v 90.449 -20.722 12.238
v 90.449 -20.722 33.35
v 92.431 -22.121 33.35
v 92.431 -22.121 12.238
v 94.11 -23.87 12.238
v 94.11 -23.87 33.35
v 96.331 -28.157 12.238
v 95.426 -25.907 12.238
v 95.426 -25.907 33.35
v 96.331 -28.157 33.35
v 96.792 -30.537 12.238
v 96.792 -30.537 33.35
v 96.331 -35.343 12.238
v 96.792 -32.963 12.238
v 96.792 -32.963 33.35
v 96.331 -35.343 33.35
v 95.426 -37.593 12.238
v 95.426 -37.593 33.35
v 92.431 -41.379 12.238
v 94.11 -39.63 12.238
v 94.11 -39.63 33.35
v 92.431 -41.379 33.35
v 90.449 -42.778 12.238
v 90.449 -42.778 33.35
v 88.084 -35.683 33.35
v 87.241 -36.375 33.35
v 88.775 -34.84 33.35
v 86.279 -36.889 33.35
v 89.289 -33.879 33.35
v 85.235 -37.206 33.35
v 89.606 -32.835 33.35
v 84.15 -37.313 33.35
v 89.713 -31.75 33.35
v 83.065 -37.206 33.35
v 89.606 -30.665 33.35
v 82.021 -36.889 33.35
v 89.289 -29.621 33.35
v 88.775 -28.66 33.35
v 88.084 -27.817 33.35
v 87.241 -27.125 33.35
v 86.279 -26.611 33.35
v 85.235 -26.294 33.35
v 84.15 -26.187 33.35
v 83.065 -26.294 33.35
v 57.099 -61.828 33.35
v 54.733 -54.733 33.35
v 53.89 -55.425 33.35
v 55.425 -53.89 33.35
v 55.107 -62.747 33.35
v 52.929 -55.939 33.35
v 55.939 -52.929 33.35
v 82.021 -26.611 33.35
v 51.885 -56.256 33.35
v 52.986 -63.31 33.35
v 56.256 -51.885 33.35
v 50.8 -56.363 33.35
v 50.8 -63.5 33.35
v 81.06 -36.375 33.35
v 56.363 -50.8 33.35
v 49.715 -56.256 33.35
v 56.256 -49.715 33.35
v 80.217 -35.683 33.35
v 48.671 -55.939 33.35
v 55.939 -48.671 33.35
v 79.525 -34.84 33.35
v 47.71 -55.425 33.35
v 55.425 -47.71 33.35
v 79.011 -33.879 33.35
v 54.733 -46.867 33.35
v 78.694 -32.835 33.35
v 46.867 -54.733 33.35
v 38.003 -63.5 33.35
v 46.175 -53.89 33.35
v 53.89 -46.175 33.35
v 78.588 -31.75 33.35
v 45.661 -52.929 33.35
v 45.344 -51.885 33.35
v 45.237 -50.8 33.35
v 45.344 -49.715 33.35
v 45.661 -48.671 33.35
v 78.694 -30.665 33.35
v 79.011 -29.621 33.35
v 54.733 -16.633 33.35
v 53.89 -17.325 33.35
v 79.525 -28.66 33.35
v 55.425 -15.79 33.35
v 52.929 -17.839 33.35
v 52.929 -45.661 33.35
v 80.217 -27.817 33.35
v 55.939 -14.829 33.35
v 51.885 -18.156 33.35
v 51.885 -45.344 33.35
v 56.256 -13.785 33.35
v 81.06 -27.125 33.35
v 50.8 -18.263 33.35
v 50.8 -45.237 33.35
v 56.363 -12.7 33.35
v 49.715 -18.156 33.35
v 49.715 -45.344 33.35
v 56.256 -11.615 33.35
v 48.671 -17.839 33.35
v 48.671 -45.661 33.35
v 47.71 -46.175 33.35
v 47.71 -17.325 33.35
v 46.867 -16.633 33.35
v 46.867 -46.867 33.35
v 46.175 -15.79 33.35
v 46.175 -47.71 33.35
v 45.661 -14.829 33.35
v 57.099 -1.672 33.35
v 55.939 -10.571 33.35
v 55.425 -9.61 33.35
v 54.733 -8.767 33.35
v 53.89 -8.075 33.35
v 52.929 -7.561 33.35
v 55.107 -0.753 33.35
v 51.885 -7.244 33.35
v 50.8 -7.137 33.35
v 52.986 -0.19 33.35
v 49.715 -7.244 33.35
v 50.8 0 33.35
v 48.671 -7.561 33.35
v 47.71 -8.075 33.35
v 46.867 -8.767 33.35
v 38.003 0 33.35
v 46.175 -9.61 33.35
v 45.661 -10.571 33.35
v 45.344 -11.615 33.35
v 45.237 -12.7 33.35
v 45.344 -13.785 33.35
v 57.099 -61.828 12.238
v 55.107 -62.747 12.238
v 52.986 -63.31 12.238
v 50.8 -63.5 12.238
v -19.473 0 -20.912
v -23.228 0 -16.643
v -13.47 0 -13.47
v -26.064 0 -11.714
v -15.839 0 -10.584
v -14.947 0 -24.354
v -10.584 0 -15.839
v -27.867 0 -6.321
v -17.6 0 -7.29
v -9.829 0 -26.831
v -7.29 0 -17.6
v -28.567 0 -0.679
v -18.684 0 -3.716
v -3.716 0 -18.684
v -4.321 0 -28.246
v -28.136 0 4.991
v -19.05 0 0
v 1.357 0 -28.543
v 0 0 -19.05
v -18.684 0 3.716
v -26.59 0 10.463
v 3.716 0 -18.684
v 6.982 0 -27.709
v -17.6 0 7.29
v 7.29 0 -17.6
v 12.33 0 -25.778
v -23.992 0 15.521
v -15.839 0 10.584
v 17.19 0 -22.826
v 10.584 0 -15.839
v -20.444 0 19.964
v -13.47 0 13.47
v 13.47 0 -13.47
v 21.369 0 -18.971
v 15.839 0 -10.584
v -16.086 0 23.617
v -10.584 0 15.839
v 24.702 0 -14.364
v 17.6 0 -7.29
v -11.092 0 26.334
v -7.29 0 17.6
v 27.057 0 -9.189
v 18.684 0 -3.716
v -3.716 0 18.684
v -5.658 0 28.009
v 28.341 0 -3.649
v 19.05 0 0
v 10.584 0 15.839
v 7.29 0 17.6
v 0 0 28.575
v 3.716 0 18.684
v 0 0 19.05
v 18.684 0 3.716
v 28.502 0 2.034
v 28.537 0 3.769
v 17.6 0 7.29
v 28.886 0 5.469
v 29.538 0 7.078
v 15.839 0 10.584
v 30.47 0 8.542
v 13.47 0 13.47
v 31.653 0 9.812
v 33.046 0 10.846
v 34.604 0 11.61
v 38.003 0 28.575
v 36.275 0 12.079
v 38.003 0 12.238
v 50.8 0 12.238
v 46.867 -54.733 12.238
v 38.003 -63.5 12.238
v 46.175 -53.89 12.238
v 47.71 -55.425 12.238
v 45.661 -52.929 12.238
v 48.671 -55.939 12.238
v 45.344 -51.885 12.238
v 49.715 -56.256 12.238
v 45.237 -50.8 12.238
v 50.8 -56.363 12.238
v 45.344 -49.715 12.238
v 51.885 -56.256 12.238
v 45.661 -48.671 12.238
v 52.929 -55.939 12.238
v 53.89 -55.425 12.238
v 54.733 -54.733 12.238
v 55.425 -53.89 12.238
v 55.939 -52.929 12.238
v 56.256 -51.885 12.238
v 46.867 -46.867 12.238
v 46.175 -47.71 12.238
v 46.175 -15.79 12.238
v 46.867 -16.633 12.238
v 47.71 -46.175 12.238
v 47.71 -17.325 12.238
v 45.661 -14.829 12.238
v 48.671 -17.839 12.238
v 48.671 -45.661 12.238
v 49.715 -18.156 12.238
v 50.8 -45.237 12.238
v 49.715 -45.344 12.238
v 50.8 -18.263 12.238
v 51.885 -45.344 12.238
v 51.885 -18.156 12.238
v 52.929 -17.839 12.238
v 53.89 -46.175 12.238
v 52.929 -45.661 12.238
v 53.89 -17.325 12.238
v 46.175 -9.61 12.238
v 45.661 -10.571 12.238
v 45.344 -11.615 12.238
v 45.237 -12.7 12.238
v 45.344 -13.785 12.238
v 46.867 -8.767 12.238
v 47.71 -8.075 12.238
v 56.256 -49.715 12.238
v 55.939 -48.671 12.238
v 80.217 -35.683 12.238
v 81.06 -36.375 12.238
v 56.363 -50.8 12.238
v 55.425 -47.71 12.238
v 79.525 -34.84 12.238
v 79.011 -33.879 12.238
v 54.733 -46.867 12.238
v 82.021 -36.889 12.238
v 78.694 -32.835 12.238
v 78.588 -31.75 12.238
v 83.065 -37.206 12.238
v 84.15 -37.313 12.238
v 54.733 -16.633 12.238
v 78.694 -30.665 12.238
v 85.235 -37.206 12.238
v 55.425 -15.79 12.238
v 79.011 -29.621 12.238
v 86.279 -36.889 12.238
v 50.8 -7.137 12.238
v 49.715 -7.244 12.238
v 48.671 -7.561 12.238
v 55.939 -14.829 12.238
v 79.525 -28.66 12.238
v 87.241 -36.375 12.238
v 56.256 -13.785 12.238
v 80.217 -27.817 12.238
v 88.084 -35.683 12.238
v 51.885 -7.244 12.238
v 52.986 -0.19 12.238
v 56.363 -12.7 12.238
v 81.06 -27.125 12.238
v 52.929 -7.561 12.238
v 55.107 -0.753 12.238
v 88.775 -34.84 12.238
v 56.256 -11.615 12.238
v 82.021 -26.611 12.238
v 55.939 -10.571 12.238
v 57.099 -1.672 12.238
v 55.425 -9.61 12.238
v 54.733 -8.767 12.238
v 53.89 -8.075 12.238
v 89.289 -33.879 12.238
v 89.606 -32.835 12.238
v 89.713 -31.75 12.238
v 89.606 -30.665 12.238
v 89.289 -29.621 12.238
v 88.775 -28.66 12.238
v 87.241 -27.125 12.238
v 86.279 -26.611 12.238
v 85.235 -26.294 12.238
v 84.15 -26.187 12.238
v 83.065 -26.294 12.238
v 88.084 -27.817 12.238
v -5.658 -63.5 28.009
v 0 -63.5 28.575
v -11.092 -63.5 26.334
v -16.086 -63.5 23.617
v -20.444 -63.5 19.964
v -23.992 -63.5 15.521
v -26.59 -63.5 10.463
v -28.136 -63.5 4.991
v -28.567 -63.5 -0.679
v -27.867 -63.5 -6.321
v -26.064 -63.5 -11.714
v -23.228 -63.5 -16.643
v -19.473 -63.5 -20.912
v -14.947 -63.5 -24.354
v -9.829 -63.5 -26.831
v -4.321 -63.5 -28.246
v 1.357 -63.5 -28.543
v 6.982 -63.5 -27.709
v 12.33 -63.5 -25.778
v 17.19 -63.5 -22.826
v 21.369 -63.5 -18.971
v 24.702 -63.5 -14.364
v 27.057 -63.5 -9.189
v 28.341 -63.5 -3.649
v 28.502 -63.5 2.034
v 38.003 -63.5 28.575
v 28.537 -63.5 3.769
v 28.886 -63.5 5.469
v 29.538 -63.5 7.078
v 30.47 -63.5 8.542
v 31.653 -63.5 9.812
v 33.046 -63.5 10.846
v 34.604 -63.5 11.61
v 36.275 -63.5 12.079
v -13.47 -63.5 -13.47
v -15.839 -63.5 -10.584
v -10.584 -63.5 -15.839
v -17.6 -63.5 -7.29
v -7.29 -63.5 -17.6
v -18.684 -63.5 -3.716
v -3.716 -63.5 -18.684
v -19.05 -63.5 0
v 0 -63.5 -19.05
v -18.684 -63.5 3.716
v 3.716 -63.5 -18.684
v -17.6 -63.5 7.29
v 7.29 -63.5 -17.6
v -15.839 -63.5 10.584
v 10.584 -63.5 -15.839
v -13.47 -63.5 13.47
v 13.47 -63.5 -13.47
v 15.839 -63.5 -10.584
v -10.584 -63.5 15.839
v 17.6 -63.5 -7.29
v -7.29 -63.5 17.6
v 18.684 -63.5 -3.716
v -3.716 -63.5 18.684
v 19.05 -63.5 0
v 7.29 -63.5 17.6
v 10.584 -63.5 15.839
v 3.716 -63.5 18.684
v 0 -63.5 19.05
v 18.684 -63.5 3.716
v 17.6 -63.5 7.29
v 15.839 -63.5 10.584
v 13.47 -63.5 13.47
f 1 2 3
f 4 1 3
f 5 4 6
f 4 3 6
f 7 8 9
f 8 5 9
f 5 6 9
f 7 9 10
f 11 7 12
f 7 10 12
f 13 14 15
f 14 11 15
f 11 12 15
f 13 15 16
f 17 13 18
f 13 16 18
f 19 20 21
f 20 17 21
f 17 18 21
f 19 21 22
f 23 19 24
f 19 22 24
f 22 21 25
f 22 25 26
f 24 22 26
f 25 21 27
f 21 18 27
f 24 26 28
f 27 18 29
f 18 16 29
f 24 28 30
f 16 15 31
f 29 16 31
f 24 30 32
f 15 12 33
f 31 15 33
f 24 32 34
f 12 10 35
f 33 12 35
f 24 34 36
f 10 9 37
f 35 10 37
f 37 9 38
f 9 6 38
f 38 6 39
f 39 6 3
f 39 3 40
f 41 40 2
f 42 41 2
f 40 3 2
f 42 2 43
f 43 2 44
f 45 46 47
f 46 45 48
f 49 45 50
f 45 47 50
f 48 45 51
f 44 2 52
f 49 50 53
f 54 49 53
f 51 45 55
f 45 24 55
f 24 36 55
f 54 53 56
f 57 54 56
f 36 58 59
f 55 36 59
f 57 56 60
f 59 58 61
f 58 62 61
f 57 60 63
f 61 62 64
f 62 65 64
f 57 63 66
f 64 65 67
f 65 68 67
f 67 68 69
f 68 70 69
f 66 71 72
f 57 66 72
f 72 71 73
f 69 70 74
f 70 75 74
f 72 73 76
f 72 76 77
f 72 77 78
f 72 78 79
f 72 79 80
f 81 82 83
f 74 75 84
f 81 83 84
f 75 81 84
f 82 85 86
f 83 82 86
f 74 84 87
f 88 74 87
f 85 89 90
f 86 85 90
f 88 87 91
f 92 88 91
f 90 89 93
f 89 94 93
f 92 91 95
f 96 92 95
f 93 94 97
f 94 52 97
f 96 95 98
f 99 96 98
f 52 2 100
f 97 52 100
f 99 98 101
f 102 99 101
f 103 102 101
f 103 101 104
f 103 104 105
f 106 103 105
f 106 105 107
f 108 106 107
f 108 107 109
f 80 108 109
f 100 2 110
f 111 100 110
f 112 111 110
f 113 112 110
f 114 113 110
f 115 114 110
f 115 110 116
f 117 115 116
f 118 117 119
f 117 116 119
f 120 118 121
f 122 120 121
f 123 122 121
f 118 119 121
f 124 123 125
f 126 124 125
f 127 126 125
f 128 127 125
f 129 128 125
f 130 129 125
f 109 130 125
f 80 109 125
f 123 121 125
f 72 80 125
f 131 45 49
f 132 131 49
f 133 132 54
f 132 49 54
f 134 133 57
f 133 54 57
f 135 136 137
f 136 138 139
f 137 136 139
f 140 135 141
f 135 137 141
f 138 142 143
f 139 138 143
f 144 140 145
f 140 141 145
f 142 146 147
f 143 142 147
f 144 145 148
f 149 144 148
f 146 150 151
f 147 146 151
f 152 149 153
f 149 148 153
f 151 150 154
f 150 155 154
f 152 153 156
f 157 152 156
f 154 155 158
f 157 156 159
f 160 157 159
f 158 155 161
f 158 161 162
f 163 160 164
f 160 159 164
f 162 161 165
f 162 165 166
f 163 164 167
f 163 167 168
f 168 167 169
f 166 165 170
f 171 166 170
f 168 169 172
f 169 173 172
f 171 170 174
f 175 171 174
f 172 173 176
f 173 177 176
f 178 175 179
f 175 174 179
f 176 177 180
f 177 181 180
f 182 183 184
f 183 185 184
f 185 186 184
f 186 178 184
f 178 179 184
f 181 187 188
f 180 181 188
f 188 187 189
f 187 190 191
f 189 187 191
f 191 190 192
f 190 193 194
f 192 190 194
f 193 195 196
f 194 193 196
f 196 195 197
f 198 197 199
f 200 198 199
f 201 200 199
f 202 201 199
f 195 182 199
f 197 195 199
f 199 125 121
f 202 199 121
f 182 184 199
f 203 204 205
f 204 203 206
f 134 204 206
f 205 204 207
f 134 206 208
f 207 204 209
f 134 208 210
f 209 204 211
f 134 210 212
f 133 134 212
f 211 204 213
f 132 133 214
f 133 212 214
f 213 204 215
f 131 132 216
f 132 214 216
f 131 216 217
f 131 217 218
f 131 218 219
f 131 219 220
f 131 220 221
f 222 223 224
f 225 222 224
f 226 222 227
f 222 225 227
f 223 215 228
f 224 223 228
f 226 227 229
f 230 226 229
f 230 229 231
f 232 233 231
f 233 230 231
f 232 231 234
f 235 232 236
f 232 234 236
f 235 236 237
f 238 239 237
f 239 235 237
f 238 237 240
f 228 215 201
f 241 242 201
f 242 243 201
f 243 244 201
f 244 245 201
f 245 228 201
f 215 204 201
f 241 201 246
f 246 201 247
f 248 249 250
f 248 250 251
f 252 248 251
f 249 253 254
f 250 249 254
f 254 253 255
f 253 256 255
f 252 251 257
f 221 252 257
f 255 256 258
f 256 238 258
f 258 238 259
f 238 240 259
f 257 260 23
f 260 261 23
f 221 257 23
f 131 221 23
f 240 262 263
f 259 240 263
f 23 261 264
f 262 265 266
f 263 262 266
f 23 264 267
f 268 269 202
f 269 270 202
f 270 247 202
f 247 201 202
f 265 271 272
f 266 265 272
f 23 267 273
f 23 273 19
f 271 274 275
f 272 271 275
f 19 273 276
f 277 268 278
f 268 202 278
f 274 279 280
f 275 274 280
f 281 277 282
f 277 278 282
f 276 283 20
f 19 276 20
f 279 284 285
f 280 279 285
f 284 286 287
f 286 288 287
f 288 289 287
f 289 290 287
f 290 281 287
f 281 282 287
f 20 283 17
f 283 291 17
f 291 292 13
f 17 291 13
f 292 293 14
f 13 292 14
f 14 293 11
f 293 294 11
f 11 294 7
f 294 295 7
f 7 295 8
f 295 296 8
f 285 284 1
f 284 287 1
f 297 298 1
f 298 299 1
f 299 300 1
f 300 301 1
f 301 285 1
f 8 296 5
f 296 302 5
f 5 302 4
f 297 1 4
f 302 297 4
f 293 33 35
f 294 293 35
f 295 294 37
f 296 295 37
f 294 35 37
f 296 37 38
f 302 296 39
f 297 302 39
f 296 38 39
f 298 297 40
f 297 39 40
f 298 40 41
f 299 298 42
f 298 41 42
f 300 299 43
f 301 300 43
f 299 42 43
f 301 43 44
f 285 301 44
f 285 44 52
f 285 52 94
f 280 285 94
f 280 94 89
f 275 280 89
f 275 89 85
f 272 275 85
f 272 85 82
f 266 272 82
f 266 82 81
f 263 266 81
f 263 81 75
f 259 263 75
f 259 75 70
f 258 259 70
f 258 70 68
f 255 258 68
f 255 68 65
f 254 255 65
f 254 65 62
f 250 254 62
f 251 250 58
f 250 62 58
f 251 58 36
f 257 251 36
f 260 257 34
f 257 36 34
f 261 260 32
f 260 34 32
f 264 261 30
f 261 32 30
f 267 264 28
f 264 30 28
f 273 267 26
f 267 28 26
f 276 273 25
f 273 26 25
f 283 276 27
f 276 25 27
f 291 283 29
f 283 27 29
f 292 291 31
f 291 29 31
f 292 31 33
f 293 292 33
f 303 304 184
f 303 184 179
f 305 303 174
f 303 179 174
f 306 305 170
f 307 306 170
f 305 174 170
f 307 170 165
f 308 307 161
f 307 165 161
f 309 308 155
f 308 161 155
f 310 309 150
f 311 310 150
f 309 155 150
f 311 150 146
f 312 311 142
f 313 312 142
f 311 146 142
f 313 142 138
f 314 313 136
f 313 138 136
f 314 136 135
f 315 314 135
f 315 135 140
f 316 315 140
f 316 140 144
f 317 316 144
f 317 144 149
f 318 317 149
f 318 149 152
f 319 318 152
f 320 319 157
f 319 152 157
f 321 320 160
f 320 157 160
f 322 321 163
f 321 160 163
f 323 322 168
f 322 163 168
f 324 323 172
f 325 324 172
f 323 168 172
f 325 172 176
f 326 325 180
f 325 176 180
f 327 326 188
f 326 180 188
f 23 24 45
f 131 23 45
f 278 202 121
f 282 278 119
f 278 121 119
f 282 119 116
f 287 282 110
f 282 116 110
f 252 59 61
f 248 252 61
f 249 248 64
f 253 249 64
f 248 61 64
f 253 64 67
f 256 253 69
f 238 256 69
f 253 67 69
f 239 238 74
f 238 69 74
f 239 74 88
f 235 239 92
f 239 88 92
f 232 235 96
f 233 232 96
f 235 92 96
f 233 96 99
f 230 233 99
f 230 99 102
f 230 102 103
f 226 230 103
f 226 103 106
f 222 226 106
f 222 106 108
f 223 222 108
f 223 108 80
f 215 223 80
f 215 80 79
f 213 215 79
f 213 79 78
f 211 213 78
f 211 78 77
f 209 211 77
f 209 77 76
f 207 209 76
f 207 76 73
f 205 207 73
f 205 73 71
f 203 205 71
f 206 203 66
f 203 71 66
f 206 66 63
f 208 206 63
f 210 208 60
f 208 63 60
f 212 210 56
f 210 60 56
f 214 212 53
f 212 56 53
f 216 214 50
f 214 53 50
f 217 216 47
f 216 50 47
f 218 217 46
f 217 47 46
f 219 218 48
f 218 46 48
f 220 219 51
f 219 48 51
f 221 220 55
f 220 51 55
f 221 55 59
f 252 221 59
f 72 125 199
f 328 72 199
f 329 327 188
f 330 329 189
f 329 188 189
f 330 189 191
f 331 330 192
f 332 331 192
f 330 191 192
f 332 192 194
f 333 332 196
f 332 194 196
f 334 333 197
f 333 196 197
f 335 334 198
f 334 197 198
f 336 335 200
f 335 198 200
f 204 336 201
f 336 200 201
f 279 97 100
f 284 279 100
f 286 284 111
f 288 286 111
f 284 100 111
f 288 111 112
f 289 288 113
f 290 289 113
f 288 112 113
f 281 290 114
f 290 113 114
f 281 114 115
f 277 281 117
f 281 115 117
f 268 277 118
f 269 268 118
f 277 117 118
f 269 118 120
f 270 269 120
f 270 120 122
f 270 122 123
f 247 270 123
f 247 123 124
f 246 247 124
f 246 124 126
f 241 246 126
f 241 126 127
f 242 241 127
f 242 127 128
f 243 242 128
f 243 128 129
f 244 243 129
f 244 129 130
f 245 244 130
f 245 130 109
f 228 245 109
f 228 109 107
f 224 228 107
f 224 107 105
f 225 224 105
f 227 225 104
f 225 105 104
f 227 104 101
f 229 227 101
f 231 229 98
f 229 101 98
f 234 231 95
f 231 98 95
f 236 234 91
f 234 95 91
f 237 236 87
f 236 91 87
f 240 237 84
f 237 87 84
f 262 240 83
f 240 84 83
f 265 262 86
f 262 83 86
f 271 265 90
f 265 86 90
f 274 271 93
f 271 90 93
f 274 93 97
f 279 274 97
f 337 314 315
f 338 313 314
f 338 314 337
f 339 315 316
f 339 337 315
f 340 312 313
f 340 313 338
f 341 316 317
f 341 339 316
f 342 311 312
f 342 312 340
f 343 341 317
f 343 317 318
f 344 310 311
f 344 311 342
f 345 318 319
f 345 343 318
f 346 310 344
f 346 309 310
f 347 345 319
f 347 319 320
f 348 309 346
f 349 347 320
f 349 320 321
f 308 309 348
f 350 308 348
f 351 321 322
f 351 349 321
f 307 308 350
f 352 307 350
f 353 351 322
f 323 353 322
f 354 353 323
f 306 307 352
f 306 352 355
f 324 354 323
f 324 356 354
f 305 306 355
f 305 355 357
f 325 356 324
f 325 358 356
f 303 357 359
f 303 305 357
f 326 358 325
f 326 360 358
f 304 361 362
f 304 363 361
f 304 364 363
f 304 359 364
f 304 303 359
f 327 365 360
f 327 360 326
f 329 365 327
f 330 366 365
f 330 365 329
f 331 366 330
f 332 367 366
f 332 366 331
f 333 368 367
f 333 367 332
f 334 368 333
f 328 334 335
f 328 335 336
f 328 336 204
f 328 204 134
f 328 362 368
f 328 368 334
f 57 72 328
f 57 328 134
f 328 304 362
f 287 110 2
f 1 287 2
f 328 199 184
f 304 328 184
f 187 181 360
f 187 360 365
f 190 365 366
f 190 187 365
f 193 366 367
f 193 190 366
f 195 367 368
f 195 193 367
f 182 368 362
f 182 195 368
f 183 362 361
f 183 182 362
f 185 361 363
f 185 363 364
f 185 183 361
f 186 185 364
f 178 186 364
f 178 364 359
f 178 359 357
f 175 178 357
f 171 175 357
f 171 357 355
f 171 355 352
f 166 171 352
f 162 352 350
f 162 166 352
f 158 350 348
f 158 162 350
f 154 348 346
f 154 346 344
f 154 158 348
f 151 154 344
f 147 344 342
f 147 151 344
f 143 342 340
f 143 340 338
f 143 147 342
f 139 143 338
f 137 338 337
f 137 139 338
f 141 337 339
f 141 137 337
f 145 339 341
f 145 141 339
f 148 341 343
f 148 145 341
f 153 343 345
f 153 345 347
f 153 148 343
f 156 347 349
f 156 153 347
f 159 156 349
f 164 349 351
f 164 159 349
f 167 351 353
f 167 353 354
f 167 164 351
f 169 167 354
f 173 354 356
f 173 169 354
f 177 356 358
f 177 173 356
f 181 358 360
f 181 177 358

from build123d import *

# Parameters (mm, degrees)
F0_R     = 19.05
F1_DEPTH = 63.5
F2_R     = 5.5626
F3_DEPTH = 25.4


with BuildPart() as f1:
    # F0 (on Front) → F1 (new body)
    with BuildSketch(Plane.XZ):
        with BuildLine():
            Line((38.003319, 28.575), (0, 28.575))
            ThreePointArc((0, 28.575), (-19.473031, -20.912476), (28.502489, 2.034391))
            ThreePointArc((28.502489, 2.034391), (31.032493, 9.203532), (38.003319, 12.237521))
            Line((38.003319, 12.237521), (101.696681, 12.237521))
            Line((101.696681, 12.237521), (101.696681, 33.3502))
            Line((101.696681, 33.3502), (38.003319, 33.3502))
            Line((38.003319, 33.3502), (38.003319, 28.575))
        make_face()
        Circle(F0_R, mode=Mode.SUBTRACT)
    extrude(amount=F1_DEPTH)

    # F2 (on face) → F3 (cut)
    with BuildSketch(Plane.XY.offset(33.3502)):
        with BuildLine():
            ThreePointArc((90.449355, -20.722279), (96.8502, -31.75), (90.449355, -42.777721))
            Line((90.449355, -42.777721), (57.099155, -61.827721))
            ThreePointArc((57.099155, -61.827721), (54.058676, -63.074813), (50.8, -63.5))
            Line((50.8, -63.5), (101.696681, -63.5))
            Line((101.696681, -63.5), (101.696681, 0))
            Line((101.696681, 0), (50.8, 0))
            ThreePointArc((50.8, 0), (54.058676, -0.425187), (57.099155, -1.672279))
            Line((57.099155, -1.672279), (90.449355, -20.722279))
        make_face()
        with Locations((50.8, -50.8)):
            Circle(F2_R)
        with Locations((84.1502, -31.75)):
            Circle(F2_R)
        with Locations((50.8, -12.7)):
            Circle(F2_R)
    extrude(amount=-F3_DEPTH, mode=Mode.SUBTRACT)


solid = f1.part
